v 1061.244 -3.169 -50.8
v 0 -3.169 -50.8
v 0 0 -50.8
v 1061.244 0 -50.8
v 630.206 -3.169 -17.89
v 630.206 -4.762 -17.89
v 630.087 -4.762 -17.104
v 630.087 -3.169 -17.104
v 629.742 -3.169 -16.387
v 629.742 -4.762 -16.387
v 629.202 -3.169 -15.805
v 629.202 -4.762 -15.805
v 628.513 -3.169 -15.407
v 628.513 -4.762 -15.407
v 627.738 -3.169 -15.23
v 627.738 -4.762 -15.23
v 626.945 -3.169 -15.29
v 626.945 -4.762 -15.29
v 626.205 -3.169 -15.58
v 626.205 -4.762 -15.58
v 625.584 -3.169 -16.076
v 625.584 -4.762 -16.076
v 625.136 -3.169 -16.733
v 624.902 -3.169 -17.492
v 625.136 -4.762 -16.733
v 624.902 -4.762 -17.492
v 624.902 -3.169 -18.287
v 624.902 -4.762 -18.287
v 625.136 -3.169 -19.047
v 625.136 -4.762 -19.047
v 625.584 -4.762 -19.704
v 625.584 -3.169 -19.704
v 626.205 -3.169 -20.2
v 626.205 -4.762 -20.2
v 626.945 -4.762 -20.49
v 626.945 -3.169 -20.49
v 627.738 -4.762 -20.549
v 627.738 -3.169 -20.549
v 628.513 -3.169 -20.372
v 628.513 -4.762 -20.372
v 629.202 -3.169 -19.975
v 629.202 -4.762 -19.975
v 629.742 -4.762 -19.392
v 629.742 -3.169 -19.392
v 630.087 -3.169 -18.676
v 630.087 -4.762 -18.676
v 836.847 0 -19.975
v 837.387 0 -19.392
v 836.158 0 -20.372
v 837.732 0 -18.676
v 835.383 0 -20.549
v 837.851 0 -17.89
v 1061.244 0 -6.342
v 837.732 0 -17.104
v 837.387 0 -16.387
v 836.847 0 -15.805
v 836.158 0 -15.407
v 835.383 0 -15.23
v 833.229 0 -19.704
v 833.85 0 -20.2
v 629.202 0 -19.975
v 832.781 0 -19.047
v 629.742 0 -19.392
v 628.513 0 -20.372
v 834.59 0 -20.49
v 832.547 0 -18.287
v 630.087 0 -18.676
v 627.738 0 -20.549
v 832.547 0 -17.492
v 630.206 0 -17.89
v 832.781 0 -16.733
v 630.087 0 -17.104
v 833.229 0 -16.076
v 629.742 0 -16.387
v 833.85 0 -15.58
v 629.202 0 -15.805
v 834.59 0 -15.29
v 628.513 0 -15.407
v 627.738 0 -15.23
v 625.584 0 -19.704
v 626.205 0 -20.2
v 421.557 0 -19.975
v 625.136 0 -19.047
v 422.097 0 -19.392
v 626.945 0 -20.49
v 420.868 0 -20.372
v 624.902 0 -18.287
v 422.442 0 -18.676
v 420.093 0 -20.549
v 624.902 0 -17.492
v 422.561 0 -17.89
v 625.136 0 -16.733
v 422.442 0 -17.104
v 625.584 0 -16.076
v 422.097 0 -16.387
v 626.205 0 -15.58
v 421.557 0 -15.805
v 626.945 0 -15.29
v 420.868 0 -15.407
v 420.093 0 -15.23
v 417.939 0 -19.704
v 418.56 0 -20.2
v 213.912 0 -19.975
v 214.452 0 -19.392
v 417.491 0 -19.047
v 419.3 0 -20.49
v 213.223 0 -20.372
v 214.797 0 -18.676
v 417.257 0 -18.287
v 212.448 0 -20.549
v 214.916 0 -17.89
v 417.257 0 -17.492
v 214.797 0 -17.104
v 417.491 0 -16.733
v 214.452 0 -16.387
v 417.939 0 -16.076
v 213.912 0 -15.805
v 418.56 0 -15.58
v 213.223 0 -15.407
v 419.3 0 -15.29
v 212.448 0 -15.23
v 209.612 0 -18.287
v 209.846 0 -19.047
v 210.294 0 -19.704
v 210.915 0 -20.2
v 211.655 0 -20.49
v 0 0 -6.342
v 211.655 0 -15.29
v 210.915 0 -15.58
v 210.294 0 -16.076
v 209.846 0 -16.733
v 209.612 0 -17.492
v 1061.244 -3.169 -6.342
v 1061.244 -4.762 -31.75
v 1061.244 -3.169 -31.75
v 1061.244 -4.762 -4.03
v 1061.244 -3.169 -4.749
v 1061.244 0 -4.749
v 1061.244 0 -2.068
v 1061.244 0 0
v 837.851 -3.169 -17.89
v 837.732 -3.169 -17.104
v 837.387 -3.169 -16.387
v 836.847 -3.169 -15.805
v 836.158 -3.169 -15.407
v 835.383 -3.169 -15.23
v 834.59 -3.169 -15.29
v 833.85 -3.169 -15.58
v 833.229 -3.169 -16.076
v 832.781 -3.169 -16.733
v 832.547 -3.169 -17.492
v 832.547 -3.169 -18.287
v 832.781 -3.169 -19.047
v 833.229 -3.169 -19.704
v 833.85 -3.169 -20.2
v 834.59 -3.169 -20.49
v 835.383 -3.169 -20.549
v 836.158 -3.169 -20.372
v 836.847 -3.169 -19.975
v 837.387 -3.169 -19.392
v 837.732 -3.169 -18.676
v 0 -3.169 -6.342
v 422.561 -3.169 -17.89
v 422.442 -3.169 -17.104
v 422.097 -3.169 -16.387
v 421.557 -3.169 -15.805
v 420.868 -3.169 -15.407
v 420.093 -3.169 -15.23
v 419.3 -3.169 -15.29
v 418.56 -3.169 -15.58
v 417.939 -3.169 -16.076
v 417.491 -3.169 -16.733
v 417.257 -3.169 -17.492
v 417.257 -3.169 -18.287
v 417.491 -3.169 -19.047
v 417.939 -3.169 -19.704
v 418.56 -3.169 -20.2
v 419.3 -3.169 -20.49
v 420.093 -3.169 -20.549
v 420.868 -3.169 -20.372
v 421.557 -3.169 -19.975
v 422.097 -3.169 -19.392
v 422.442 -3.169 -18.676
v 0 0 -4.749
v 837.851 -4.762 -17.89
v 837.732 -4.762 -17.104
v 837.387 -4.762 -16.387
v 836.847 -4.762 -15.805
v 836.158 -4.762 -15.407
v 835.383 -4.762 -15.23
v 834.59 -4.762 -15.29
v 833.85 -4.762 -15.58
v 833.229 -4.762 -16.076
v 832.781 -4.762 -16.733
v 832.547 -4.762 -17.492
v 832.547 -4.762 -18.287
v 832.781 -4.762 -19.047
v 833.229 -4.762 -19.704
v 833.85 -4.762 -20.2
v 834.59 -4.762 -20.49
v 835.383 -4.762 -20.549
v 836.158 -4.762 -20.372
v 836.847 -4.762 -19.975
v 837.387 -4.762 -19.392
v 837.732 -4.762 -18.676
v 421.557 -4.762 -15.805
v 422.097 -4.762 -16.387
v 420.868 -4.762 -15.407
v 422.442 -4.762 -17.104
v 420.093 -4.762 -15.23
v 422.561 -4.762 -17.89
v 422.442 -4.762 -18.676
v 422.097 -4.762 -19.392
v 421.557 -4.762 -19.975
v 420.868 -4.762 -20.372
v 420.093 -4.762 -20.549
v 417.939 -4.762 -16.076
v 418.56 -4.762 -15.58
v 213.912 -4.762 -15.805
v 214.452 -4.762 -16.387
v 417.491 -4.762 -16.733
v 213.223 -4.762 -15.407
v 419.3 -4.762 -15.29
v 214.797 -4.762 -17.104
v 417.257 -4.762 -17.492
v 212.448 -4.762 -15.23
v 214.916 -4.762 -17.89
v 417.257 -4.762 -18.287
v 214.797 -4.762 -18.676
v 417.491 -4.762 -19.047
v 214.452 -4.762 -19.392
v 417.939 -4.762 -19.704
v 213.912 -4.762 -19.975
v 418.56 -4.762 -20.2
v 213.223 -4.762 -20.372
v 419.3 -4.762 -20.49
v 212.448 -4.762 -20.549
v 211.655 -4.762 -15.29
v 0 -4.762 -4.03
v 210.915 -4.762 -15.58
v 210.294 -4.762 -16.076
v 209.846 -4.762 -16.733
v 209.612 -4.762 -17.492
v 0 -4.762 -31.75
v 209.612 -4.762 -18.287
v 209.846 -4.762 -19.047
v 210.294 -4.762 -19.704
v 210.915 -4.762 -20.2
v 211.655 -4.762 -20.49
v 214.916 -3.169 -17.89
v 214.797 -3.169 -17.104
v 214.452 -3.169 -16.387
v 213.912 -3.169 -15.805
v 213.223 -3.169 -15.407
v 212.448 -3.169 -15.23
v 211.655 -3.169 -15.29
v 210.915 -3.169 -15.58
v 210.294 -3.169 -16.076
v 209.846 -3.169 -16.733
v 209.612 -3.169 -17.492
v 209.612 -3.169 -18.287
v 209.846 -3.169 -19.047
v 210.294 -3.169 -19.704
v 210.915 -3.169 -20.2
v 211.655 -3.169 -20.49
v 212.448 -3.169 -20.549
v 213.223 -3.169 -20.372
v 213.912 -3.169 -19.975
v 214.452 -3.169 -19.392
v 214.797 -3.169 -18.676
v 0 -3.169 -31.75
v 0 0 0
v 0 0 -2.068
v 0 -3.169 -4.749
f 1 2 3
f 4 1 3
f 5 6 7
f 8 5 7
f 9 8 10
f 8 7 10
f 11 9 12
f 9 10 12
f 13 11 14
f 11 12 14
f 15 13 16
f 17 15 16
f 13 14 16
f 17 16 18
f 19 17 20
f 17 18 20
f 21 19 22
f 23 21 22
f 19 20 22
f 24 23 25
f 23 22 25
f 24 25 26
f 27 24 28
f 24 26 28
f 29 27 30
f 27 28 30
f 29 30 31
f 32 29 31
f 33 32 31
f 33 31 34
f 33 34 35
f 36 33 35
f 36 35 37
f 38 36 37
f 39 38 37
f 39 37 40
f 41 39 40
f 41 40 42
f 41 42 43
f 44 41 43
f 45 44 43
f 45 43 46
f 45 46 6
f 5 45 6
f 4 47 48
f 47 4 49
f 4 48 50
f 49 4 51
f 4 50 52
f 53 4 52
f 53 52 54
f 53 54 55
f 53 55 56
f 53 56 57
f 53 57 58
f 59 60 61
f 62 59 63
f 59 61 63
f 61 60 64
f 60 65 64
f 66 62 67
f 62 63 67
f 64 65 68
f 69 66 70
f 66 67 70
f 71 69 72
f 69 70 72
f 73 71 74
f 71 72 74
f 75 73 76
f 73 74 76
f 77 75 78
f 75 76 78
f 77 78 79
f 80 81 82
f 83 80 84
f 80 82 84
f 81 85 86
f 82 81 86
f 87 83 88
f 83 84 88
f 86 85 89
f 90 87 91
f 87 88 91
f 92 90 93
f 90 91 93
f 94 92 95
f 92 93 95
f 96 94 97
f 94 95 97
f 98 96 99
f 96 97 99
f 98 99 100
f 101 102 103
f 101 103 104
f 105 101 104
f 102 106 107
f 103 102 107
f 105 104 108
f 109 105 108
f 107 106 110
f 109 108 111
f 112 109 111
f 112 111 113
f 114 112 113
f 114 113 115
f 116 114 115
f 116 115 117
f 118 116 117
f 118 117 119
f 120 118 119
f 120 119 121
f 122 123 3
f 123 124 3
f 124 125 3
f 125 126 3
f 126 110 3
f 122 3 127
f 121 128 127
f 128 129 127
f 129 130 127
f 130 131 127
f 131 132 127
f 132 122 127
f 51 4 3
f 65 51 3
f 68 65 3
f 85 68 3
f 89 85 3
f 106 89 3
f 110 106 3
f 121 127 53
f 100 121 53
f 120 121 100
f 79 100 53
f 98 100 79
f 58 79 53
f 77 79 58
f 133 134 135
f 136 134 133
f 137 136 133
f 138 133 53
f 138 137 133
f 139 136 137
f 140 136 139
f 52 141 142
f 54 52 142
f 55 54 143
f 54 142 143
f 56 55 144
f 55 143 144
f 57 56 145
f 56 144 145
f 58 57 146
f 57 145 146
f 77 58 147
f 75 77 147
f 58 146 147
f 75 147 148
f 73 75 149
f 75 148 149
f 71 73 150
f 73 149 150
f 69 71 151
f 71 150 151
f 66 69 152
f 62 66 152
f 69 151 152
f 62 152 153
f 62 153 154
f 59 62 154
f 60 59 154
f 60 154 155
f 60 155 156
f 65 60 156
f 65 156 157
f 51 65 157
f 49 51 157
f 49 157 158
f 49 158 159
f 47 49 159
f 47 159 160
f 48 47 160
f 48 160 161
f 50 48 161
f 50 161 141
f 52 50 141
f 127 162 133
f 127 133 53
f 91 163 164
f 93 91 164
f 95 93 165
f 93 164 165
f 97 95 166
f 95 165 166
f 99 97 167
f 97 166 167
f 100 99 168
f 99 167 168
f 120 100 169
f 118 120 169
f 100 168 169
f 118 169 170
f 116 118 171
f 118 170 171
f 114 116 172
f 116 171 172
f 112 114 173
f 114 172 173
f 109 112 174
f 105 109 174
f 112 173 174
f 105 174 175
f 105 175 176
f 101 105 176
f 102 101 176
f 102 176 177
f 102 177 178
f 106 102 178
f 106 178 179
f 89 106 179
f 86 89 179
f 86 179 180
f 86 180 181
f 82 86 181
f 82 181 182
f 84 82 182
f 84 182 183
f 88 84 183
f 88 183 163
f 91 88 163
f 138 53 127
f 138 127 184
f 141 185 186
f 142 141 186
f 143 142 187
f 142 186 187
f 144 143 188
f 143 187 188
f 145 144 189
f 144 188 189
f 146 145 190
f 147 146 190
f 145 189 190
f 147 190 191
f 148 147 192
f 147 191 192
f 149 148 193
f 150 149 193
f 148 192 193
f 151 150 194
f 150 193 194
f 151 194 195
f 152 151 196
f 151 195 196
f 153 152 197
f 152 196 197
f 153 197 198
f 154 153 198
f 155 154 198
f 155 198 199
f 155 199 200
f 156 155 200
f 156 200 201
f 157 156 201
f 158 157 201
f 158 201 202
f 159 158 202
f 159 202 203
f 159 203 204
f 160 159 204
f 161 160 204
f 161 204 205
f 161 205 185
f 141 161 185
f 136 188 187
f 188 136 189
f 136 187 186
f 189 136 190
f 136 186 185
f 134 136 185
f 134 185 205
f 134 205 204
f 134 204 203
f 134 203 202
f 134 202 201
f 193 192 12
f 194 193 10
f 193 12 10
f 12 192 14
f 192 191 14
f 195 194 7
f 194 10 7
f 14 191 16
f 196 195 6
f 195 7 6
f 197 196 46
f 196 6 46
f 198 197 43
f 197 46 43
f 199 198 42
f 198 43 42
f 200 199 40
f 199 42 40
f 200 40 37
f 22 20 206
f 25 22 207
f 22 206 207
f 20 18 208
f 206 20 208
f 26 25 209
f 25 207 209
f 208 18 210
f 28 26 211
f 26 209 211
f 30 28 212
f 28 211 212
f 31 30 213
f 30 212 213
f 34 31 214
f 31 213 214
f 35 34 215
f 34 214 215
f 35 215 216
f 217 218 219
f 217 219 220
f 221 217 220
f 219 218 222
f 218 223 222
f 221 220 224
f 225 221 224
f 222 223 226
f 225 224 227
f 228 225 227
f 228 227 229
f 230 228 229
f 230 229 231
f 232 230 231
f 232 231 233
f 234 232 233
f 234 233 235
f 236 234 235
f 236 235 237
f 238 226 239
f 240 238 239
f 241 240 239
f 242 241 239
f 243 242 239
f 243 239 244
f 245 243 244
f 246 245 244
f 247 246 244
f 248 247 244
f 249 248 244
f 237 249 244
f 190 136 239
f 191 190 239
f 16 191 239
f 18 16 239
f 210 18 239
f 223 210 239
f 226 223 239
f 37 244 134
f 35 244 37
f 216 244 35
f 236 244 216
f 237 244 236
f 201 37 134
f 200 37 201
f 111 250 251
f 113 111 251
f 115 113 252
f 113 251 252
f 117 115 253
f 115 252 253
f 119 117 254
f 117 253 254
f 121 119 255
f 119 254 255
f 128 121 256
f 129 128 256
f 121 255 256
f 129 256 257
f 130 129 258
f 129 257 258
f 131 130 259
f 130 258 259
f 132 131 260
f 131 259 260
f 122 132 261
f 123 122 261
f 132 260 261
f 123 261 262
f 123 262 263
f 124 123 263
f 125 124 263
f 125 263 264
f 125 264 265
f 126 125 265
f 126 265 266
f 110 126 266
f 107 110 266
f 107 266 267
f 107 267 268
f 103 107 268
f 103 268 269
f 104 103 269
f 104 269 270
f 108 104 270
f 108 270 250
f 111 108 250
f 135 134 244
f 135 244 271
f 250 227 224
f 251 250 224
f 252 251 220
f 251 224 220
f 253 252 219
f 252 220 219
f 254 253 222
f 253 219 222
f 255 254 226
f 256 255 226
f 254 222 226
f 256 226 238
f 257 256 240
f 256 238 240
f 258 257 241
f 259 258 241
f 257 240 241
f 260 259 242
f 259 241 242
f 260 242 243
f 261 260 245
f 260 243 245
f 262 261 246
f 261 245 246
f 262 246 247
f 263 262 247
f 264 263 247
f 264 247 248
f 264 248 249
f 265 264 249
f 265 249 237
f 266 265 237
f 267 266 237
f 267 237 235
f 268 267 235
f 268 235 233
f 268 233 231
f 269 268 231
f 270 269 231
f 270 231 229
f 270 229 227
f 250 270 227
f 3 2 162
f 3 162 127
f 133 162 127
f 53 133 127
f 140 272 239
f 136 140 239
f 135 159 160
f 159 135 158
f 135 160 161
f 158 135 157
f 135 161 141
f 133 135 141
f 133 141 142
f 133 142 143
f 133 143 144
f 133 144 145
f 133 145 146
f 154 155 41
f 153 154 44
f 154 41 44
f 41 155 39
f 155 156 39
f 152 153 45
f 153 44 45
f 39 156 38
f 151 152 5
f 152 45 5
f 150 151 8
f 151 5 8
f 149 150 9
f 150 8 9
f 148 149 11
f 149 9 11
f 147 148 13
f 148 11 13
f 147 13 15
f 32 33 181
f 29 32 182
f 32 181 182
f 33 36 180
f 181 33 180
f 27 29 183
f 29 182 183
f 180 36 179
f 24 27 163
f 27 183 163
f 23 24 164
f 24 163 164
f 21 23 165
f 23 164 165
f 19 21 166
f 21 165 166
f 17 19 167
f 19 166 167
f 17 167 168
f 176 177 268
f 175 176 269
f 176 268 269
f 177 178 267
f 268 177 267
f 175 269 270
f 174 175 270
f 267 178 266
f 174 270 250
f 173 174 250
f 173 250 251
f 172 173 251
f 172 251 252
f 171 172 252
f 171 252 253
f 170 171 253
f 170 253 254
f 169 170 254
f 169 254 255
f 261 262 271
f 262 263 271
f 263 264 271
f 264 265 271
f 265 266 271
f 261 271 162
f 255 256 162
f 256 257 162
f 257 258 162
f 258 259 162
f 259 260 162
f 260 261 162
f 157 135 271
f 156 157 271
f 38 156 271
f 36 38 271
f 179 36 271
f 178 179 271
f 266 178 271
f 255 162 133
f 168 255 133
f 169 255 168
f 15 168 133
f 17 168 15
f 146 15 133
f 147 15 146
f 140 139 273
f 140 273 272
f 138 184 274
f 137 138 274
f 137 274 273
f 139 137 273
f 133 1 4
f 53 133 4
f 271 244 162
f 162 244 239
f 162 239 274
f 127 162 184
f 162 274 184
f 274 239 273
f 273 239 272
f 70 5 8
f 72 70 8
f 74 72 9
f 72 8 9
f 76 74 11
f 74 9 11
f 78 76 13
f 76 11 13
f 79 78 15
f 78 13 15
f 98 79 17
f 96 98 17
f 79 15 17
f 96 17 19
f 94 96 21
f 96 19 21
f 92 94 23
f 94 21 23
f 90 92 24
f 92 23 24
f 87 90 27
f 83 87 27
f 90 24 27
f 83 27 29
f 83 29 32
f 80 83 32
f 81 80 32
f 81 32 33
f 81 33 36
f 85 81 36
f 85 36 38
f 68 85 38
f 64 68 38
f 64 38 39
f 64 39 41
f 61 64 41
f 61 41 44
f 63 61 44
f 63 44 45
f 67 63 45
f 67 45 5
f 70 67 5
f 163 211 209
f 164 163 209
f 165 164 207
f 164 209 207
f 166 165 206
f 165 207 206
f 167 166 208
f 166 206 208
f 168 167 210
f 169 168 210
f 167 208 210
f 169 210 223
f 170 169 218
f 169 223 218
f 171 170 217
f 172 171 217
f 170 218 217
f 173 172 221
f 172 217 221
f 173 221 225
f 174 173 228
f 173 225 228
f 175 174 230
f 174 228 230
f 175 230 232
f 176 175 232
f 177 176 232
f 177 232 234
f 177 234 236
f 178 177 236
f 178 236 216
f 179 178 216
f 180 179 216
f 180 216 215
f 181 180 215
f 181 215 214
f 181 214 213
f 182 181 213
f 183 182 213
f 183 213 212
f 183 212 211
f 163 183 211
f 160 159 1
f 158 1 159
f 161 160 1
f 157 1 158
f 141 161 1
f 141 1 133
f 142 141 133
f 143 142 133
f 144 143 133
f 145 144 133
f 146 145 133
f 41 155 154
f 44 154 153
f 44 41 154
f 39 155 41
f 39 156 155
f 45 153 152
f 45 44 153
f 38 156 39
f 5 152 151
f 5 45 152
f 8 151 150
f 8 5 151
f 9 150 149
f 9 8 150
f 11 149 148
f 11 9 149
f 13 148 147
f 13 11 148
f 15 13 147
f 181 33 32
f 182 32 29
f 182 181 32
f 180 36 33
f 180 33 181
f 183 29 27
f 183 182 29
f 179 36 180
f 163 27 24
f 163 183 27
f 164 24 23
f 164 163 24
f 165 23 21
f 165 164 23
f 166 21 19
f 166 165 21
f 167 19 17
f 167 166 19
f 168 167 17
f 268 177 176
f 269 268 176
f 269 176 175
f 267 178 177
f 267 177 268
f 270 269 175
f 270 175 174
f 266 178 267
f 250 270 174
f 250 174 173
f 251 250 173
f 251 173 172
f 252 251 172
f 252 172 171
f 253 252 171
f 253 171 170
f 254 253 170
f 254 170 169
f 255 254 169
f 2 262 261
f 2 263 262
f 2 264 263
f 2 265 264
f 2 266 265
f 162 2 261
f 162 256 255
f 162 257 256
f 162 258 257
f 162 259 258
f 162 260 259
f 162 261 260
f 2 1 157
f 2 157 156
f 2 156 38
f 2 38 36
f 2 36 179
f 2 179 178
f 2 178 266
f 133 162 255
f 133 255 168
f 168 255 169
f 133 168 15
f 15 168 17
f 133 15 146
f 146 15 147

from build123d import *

# Parameters (mm, degrees)
F1_DEPTH = 1061.24375
F2_W     = 3.16943
F2_H     = 44.457636
F3_DEPTH = 1061.24375
F4_R     = 2.667
F5_DEPTH = 4.7635


with BuildPart() as f1:
    # F0 (on Right) → F1 (new body)
    with BuildSketch(Plane.YZ):
        Polygon((0, -2.067539), (0, 0), (-4.7625, -4.029702), (-4.7625, -31.75), (-3.16943, -31.75), (-3.16943, -6.342364), (0, -6.342364), (0, -4.749294), (-3.16943, -4.749294), align=None)
    extrude(amount=F1_DEPTH)


with BuildPart() as f3:
    # F2 (on Right) → F3 (new body, through all)
    with BuildSketch(Plane.YZ):
        with Locations((-1.584715, -28.571182)):
            Rectangle(F2_W, F2_H)
    extrude(amount=F3_DEPTH)


with BuildPart() as f5_tool:
    # F4 (on face) → F5 (new body, through all)
    with BuildSketch(Plane.XZ.offset(4.7625)):
        with Locations((212.24875, -17.889851)):
            Circle(F4_R)
        with Locations((419.89375, -17.889851)):
            Circle(F4_R)
        with Locations((627.53875, -17.889851)):
            Circle(F4_R)
        with Locations((835.18375, -17.889851)):
            Circle(F4_R)
    extrude(amount=-F5_DEPTH)


with BuildPart() as f1_1:
    add(f1.part)

    # F5: cut by f5_tool
    add(f5_tool.part, mode=Mode.SUBTRACT)


with BuildPart() as f3_1:
    add(f3.part)

    # F5: cut by f5_tool
    add(f5_tool.part, mode=Mode.SUBTRACT)


solid = Compound([f1_1.part, f3_1.part])
